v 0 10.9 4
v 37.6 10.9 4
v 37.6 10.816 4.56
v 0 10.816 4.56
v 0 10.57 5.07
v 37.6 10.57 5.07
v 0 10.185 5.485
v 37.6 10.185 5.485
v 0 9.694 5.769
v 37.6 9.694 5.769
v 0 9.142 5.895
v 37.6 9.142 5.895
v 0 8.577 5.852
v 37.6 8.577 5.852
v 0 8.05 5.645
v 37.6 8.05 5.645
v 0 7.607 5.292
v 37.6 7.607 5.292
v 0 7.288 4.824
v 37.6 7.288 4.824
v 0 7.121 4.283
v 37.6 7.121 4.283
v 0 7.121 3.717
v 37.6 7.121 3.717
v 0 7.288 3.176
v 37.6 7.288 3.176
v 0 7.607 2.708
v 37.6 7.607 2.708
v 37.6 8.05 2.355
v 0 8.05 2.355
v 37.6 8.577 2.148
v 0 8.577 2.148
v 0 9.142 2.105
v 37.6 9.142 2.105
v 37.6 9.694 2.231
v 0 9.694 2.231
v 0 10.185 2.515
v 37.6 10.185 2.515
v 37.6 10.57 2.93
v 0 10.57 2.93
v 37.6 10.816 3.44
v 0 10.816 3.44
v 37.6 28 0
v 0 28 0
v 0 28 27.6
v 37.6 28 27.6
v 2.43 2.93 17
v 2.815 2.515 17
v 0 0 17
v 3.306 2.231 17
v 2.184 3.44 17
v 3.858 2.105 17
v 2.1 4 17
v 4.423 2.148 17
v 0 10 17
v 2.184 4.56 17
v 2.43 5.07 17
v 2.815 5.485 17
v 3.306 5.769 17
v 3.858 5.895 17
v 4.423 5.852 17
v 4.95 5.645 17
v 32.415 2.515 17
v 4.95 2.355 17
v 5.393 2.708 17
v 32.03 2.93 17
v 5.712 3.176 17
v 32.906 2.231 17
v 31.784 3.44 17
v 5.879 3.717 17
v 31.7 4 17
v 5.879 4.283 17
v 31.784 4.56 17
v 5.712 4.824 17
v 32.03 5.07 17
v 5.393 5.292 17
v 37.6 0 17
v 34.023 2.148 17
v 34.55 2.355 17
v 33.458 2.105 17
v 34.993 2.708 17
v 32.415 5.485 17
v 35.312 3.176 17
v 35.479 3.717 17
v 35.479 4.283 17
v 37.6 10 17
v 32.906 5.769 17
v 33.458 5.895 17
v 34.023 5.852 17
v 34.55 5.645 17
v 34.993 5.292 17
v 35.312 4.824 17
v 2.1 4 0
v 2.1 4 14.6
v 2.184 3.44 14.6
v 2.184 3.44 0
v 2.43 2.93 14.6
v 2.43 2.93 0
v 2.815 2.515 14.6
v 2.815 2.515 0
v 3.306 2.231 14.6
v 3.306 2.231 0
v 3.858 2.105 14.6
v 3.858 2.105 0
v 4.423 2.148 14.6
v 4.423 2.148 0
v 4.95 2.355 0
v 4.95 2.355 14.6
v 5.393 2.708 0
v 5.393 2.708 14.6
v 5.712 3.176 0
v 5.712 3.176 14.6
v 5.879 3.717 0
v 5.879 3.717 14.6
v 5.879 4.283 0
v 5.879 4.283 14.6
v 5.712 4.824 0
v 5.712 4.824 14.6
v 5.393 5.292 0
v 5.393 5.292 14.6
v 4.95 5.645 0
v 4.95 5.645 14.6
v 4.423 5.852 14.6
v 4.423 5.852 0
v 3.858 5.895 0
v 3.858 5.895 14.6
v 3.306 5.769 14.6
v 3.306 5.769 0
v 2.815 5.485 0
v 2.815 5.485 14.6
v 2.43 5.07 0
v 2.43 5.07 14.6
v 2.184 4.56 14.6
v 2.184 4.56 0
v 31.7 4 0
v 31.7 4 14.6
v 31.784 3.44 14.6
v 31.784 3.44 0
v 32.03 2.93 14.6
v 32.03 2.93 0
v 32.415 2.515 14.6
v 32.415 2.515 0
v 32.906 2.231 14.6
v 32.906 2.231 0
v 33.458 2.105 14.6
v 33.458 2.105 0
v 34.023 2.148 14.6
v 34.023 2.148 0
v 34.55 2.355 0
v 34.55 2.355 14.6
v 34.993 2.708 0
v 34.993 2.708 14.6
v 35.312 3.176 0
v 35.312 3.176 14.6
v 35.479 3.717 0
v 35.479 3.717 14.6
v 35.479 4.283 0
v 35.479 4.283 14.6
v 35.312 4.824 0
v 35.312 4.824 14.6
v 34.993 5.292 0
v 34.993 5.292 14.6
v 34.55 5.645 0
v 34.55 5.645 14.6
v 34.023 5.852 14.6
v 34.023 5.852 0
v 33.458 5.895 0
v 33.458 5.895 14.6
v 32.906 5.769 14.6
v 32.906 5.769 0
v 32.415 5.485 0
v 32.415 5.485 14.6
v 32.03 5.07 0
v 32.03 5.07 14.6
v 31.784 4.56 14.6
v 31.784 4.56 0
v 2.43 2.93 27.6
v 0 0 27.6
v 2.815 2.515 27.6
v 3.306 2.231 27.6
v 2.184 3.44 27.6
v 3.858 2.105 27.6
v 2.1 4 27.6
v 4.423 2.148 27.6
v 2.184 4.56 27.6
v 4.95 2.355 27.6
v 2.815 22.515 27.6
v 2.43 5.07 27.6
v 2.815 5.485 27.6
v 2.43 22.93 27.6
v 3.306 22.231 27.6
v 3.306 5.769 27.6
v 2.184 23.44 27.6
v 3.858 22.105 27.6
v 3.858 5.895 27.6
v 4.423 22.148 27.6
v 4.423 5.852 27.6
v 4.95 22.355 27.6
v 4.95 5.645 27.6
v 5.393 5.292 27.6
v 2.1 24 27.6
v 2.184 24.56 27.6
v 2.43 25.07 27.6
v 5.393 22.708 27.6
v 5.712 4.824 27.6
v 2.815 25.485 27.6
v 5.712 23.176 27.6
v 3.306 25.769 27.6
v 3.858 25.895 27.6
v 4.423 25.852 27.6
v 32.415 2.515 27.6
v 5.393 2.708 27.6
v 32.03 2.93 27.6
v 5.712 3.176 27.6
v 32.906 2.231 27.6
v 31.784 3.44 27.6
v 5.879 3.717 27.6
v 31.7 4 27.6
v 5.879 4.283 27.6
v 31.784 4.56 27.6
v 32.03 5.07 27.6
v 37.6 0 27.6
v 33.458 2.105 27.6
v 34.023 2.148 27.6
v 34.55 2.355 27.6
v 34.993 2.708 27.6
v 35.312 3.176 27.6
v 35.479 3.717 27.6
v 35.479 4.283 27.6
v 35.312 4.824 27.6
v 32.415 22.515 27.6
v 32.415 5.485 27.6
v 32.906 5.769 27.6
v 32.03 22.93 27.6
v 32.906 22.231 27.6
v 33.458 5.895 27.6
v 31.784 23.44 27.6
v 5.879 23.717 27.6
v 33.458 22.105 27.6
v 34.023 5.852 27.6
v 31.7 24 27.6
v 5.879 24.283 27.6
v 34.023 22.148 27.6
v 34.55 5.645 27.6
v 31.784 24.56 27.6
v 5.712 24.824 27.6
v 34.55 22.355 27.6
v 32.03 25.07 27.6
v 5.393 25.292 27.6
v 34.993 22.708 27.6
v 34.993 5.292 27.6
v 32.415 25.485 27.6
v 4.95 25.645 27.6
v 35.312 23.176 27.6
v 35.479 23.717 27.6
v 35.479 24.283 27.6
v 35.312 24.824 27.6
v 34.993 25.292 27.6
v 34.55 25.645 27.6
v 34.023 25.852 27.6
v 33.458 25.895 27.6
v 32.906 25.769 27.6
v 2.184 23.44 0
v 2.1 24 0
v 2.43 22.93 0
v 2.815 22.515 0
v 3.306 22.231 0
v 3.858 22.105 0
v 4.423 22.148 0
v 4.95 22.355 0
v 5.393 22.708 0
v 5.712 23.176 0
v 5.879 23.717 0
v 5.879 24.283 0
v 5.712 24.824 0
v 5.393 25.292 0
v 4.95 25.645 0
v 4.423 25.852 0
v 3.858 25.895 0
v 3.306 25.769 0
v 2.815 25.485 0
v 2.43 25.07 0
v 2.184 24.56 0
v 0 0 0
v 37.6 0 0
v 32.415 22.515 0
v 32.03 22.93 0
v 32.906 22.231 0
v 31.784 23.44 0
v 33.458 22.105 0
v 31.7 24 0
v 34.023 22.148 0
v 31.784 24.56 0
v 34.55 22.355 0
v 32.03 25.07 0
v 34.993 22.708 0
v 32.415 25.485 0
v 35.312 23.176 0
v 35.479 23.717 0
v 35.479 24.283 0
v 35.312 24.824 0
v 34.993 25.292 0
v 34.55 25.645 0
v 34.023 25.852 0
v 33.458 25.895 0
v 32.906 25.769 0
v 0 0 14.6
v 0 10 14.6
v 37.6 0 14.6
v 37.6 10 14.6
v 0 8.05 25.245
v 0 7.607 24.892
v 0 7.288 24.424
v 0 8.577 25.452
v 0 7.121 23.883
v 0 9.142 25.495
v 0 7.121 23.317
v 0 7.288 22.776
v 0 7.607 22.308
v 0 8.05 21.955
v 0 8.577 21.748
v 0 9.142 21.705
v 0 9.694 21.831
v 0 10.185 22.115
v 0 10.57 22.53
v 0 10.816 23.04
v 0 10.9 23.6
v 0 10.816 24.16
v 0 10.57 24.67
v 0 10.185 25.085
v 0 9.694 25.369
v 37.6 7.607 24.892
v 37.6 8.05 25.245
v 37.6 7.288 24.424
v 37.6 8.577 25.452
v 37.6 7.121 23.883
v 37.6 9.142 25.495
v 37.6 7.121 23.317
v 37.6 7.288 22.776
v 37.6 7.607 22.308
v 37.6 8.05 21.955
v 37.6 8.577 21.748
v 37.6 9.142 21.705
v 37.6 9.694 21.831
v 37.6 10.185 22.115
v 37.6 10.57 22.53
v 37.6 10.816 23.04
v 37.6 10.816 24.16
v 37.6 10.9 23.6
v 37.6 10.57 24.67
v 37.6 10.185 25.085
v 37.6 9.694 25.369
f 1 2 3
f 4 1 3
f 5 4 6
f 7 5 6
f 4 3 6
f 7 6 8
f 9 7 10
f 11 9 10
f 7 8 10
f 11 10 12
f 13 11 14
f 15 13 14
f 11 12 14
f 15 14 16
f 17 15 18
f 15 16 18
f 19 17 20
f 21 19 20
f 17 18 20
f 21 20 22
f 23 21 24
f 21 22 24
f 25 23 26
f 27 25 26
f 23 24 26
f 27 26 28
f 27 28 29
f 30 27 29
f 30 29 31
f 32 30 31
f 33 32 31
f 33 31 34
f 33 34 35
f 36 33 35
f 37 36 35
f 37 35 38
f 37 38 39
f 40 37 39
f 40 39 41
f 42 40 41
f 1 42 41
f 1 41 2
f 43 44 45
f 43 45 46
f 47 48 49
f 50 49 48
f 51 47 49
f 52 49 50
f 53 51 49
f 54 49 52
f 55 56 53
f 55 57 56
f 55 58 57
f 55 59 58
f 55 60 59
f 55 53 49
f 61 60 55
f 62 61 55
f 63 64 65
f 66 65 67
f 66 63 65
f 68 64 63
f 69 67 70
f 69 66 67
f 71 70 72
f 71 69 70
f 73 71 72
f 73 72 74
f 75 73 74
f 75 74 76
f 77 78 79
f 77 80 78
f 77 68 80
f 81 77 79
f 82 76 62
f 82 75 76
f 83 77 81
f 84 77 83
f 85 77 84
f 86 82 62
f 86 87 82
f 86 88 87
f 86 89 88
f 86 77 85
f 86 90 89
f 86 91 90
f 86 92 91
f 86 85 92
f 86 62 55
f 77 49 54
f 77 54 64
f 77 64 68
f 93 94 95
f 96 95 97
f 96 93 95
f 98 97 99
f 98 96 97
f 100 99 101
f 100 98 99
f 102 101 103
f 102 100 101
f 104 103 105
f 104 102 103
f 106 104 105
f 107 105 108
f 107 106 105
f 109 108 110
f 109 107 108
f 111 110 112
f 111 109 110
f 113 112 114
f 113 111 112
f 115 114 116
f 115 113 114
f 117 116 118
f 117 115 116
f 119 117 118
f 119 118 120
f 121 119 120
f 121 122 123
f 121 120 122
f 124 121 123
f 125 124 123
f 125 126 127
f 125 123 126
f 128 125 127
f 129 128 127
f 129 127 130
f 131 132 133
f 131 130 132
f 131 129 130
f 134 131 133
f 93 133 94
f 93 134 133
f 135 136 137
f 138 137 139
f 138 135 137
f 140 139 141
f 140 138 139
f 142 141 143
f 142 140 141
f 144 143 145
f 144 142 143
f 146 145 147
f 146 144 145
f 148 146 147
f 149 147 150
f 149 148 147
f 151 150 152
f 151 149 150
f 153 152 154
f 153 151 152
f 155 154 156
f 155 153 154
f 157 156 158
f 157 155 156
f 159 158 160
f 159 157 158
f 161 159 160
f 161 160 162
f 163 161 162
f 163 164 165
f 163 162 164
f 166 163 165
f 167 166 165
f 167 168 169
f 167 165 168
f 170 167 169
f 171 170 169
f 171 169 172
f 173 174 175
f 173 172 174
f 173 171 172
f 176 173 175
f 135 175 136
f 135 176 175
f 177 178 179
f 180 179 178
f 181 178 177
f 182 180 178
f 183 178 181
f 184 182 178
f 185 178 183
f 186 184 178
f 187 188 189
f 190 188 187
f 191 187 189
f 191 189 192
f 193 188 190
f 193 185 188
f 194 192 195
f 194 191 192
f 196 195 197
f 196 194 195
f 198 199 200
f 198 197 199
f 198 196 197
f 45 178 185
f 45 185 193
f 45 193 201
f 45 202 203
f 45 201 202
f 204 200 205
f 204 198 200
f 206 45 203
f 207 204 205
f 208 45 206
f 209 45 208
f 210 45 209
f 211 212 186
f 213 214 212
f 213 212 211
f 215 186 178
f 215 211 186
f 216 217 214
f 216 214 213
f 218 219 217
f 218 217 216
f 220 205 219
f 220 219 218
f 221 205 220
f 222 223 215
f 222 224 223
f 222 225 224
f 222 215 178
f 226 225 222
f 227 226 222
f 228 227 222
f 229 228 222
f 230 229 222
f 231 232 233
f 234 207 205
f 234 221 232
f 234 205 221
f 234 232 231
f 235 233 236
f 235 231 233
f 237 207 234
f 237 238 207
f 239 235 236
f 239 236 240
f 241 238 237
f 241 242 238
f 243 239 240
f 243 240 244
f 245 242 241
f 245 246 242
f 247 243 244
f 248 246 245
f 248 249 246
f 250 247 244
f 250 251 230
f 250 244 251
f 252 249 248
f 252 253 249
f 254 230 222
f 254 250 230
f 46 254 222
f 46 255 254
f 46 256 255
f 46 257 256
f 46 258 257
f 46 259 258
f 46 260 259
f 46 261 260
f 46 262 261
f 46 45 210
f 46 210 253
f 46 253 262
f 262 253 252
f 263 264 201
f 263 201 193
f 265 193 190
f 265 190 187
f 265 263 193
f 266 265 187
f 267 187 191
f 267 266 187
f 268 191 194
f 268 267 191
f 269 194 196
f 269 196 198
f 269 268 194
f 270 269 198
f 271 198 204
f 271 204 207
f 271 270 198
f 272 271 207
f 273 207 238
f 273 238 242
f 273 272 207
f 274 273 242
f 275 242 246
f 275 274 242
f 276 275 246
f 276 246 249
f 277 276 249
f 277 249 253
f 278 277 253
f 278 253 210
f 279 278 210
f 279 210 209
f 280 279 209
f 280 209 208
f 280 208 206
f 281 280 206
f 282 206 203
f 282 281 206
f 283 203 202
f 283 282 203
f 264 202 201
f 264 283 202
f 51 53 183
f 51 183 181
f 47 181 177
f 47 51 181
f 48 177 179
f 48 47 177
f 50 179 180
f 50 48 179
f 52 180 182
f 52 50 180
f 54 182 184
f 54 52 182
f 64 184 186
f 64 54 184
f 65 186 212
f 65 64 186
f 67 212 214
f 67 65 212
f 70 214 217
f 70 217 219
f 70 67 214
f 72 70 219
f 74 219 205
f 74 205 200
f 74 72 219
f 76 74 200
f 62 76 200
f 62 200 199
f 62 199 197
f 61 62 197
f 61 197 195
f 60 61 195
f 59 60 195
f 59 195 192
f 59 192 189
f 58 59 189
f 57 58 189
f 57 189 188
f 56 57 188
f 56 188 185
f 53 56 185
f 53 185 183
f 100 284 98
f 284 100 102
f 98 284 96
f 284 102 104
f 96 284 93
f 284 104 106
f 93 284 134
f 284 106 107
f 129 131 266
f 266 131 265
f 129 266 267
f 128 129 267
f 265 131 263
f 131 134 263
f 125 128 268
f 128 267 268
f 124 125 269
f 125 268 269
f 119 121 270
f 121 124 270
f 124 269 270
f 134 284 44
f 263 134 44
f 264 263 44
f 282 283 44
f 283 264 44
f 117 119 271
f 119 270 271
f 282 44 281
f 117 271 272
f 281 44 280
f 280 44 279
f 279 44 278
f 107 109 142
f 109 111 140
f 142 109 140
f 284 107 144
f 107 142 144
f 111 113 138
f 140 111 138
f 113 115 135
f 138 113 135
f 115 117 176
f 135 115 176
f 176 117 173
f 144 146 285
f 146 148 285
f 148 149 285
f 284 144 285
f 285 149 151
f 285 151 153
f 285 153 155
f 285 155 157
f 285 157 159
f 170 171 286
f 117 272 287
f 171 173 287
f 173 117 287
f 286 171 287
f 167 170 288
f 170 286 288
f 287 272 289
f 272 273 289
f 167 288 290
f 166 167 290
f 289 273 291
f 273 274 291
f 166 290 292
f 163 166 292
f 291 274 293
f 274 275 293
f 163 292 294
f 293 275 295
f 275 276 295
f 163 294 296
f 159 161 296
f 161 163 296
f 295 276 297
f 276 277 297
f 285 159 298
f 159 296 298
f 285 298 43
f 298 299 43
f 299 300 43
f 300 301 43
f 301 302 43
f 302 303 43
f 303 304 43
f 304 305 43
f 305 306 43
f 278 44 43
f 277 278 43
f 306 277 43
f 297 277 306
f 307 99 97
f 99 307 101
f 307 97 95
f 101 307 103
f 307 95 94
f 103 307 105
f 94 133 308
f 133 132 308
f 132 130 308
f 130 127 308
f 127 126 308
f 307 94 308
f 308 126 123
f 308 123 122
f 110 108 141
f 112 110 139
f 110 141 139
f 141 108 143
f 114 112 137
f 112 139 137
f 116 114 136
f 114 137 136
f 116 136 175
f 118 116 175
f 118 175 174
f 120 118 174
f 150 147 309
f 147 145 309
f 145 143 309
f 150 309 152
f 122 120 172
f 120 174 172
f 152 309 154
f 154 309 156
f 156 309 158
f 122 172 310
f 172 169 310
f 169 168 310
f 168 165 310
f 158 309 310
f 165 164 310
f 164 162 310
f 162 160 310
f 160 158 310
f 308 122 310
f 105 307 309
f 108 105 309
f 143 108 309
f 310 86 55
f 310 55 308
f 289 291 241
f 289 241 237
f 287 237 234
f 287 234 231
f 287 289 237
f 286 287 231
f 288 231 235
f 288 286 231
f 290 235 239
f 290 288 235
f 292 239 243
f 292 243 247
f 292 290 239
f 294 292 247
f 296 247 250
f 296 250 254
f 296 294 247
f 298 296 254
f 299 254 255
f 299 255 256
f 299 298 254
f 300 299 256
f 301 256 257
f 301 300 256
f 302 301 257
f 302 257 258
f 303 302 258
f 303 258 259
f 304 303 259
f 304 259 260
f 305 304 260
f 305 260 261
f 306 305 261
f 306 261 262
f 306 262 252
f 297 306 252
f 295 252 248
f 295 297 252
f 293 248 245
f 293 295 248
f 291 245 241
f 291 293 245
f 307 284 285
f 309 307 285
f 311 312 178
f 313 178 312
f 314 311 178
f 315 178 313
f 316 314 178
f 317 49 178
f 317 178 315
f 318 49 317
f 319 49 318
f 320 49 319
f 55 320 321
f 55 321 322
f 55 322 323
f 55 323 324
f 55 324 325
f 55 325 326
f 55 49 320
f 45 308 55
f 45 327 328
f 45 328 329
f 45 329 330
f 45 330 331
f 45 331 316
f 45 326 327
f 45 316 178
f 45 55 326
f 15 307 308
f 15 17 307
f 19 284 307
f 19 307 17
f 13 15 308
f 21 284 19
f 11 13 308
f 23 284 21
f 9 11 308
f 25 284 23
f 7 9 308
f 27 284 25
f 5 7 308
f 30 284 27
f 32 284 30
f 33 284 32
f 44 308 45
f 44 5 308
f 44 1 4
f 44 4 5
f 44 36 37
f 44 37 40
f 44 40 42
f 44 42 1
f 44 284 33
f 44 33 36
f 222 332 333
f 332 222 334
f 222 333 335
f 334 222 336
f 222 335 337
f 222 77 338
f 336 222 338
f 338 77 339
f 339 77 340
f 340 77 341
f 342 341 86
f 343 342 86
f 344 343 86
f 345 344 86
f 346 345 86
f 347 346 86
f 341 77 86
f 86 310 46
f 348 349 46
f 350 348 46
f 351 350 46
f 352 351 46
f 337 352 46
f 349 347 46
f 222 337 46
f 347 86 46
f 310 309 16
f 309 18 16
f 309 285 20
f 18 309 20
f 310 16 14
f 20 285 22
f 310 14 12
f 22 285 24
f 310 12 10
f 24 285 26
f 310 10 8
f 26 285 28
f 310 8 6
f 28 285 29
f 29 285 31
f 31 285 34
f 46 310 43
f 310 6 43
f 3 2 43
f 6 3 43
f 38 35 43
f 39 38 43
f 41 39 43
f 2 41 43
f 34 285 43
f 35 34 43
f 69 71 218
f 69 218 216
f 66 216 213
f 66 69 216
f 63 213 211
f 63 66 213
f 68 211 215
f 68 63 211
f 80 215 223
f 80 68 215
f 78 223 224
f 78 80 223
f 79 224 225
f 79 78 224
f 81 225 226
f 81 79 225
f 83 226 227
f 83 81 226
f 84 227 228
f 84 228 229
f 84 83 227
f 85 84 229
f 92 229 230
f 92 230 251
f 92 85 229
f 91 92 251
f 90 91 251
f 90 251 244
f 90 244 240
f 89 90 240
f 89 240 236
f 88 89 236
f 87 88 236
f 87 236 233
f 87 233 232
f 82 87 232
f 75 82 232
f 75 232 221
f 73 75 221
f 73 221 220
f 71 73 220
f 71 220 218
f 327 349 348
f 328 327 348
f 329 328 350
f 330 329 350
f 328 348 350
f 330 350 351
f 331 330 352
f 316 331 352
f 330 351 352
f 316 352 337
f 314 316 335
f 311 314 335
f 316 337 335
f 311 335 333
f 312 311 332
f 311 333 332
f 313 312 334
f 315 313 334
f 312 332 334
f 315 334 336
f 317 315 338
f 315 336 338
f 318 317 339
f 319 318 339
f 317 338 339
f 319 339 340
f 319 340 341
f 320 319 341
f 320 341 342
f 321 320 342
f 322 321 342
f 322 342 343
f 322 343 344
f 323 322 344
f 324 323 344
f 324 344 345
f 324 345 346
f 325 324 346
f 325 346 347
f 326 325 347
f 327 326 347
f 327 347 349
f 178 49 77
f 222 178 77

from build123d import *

# Parameters (mm, degrees)
SKETCH_1_W          = 37.6
SKETCH_1_H          = 28
SKETCH_1_R          = 1.9
EXTRUDE_1_DEPTH     = 27.6
SKETCH_2_R          = 1.9
SKETCH_2_W          = 2.4
SKETCH_2_H          = 10
CUT_EXTRUDE_1_DEPTH = 55.401470568


with BuildPart() as part:
    # 草图1 → 凸台-拉伸1 (new body)
    with BuildSketch(Plane.XY):
        with Locations((18.8, 14)):
            Rectangle(SKETCH_1_W, SKETCH_1_H)
        with Locations(Location((4, 24, 0), (0, 0, 180))):
            Circle(SKETCH_1_R, mode=Mode.SUBTRACT)
        with Locations(Location((33.6, 24, 0), (0, 0, 180))):
            Circle(SKETCH_1_R, mode=Mode.SUBTRACT)
        with Locations(Location((33.6, 4, 0), (0, 0, 180))):
            Circle(SKETCH_1_R, mode=Mode.SUBTRACT)
        with Locations(Location((4, 4, 0), (0, 0, 180))):
            Circle(SKETCH_1_R, mode=Mode.SUBTRACT)
    extrude(amount=EXTRUDE_1_DEPTH)

    # 草图2 → 切除-拉伸1 (cut, through all)
    with BuildSketch(Plane(origin=(37.6, 0, 0), x_dir=(0, 0, -1), z_dir=(1, 0, 0))):
        with Locations(Location((-23.6, 9, 0), (0, 0, 90))):
            Circle(SKETCH_2_R)
        with Locations(Location((-4, 9, 0), (0, 0, 90))):
            Circle(SKETCH_2_R)
        with Locations((-15.8, 5)):
            Rectangle(SKETCH_2_W, SKETCH_2_H)
    extrude(amount=-CUT_EXTRUDE_1_DEPTH, mode=Mode.SUBTRACT)


solid = part.part
